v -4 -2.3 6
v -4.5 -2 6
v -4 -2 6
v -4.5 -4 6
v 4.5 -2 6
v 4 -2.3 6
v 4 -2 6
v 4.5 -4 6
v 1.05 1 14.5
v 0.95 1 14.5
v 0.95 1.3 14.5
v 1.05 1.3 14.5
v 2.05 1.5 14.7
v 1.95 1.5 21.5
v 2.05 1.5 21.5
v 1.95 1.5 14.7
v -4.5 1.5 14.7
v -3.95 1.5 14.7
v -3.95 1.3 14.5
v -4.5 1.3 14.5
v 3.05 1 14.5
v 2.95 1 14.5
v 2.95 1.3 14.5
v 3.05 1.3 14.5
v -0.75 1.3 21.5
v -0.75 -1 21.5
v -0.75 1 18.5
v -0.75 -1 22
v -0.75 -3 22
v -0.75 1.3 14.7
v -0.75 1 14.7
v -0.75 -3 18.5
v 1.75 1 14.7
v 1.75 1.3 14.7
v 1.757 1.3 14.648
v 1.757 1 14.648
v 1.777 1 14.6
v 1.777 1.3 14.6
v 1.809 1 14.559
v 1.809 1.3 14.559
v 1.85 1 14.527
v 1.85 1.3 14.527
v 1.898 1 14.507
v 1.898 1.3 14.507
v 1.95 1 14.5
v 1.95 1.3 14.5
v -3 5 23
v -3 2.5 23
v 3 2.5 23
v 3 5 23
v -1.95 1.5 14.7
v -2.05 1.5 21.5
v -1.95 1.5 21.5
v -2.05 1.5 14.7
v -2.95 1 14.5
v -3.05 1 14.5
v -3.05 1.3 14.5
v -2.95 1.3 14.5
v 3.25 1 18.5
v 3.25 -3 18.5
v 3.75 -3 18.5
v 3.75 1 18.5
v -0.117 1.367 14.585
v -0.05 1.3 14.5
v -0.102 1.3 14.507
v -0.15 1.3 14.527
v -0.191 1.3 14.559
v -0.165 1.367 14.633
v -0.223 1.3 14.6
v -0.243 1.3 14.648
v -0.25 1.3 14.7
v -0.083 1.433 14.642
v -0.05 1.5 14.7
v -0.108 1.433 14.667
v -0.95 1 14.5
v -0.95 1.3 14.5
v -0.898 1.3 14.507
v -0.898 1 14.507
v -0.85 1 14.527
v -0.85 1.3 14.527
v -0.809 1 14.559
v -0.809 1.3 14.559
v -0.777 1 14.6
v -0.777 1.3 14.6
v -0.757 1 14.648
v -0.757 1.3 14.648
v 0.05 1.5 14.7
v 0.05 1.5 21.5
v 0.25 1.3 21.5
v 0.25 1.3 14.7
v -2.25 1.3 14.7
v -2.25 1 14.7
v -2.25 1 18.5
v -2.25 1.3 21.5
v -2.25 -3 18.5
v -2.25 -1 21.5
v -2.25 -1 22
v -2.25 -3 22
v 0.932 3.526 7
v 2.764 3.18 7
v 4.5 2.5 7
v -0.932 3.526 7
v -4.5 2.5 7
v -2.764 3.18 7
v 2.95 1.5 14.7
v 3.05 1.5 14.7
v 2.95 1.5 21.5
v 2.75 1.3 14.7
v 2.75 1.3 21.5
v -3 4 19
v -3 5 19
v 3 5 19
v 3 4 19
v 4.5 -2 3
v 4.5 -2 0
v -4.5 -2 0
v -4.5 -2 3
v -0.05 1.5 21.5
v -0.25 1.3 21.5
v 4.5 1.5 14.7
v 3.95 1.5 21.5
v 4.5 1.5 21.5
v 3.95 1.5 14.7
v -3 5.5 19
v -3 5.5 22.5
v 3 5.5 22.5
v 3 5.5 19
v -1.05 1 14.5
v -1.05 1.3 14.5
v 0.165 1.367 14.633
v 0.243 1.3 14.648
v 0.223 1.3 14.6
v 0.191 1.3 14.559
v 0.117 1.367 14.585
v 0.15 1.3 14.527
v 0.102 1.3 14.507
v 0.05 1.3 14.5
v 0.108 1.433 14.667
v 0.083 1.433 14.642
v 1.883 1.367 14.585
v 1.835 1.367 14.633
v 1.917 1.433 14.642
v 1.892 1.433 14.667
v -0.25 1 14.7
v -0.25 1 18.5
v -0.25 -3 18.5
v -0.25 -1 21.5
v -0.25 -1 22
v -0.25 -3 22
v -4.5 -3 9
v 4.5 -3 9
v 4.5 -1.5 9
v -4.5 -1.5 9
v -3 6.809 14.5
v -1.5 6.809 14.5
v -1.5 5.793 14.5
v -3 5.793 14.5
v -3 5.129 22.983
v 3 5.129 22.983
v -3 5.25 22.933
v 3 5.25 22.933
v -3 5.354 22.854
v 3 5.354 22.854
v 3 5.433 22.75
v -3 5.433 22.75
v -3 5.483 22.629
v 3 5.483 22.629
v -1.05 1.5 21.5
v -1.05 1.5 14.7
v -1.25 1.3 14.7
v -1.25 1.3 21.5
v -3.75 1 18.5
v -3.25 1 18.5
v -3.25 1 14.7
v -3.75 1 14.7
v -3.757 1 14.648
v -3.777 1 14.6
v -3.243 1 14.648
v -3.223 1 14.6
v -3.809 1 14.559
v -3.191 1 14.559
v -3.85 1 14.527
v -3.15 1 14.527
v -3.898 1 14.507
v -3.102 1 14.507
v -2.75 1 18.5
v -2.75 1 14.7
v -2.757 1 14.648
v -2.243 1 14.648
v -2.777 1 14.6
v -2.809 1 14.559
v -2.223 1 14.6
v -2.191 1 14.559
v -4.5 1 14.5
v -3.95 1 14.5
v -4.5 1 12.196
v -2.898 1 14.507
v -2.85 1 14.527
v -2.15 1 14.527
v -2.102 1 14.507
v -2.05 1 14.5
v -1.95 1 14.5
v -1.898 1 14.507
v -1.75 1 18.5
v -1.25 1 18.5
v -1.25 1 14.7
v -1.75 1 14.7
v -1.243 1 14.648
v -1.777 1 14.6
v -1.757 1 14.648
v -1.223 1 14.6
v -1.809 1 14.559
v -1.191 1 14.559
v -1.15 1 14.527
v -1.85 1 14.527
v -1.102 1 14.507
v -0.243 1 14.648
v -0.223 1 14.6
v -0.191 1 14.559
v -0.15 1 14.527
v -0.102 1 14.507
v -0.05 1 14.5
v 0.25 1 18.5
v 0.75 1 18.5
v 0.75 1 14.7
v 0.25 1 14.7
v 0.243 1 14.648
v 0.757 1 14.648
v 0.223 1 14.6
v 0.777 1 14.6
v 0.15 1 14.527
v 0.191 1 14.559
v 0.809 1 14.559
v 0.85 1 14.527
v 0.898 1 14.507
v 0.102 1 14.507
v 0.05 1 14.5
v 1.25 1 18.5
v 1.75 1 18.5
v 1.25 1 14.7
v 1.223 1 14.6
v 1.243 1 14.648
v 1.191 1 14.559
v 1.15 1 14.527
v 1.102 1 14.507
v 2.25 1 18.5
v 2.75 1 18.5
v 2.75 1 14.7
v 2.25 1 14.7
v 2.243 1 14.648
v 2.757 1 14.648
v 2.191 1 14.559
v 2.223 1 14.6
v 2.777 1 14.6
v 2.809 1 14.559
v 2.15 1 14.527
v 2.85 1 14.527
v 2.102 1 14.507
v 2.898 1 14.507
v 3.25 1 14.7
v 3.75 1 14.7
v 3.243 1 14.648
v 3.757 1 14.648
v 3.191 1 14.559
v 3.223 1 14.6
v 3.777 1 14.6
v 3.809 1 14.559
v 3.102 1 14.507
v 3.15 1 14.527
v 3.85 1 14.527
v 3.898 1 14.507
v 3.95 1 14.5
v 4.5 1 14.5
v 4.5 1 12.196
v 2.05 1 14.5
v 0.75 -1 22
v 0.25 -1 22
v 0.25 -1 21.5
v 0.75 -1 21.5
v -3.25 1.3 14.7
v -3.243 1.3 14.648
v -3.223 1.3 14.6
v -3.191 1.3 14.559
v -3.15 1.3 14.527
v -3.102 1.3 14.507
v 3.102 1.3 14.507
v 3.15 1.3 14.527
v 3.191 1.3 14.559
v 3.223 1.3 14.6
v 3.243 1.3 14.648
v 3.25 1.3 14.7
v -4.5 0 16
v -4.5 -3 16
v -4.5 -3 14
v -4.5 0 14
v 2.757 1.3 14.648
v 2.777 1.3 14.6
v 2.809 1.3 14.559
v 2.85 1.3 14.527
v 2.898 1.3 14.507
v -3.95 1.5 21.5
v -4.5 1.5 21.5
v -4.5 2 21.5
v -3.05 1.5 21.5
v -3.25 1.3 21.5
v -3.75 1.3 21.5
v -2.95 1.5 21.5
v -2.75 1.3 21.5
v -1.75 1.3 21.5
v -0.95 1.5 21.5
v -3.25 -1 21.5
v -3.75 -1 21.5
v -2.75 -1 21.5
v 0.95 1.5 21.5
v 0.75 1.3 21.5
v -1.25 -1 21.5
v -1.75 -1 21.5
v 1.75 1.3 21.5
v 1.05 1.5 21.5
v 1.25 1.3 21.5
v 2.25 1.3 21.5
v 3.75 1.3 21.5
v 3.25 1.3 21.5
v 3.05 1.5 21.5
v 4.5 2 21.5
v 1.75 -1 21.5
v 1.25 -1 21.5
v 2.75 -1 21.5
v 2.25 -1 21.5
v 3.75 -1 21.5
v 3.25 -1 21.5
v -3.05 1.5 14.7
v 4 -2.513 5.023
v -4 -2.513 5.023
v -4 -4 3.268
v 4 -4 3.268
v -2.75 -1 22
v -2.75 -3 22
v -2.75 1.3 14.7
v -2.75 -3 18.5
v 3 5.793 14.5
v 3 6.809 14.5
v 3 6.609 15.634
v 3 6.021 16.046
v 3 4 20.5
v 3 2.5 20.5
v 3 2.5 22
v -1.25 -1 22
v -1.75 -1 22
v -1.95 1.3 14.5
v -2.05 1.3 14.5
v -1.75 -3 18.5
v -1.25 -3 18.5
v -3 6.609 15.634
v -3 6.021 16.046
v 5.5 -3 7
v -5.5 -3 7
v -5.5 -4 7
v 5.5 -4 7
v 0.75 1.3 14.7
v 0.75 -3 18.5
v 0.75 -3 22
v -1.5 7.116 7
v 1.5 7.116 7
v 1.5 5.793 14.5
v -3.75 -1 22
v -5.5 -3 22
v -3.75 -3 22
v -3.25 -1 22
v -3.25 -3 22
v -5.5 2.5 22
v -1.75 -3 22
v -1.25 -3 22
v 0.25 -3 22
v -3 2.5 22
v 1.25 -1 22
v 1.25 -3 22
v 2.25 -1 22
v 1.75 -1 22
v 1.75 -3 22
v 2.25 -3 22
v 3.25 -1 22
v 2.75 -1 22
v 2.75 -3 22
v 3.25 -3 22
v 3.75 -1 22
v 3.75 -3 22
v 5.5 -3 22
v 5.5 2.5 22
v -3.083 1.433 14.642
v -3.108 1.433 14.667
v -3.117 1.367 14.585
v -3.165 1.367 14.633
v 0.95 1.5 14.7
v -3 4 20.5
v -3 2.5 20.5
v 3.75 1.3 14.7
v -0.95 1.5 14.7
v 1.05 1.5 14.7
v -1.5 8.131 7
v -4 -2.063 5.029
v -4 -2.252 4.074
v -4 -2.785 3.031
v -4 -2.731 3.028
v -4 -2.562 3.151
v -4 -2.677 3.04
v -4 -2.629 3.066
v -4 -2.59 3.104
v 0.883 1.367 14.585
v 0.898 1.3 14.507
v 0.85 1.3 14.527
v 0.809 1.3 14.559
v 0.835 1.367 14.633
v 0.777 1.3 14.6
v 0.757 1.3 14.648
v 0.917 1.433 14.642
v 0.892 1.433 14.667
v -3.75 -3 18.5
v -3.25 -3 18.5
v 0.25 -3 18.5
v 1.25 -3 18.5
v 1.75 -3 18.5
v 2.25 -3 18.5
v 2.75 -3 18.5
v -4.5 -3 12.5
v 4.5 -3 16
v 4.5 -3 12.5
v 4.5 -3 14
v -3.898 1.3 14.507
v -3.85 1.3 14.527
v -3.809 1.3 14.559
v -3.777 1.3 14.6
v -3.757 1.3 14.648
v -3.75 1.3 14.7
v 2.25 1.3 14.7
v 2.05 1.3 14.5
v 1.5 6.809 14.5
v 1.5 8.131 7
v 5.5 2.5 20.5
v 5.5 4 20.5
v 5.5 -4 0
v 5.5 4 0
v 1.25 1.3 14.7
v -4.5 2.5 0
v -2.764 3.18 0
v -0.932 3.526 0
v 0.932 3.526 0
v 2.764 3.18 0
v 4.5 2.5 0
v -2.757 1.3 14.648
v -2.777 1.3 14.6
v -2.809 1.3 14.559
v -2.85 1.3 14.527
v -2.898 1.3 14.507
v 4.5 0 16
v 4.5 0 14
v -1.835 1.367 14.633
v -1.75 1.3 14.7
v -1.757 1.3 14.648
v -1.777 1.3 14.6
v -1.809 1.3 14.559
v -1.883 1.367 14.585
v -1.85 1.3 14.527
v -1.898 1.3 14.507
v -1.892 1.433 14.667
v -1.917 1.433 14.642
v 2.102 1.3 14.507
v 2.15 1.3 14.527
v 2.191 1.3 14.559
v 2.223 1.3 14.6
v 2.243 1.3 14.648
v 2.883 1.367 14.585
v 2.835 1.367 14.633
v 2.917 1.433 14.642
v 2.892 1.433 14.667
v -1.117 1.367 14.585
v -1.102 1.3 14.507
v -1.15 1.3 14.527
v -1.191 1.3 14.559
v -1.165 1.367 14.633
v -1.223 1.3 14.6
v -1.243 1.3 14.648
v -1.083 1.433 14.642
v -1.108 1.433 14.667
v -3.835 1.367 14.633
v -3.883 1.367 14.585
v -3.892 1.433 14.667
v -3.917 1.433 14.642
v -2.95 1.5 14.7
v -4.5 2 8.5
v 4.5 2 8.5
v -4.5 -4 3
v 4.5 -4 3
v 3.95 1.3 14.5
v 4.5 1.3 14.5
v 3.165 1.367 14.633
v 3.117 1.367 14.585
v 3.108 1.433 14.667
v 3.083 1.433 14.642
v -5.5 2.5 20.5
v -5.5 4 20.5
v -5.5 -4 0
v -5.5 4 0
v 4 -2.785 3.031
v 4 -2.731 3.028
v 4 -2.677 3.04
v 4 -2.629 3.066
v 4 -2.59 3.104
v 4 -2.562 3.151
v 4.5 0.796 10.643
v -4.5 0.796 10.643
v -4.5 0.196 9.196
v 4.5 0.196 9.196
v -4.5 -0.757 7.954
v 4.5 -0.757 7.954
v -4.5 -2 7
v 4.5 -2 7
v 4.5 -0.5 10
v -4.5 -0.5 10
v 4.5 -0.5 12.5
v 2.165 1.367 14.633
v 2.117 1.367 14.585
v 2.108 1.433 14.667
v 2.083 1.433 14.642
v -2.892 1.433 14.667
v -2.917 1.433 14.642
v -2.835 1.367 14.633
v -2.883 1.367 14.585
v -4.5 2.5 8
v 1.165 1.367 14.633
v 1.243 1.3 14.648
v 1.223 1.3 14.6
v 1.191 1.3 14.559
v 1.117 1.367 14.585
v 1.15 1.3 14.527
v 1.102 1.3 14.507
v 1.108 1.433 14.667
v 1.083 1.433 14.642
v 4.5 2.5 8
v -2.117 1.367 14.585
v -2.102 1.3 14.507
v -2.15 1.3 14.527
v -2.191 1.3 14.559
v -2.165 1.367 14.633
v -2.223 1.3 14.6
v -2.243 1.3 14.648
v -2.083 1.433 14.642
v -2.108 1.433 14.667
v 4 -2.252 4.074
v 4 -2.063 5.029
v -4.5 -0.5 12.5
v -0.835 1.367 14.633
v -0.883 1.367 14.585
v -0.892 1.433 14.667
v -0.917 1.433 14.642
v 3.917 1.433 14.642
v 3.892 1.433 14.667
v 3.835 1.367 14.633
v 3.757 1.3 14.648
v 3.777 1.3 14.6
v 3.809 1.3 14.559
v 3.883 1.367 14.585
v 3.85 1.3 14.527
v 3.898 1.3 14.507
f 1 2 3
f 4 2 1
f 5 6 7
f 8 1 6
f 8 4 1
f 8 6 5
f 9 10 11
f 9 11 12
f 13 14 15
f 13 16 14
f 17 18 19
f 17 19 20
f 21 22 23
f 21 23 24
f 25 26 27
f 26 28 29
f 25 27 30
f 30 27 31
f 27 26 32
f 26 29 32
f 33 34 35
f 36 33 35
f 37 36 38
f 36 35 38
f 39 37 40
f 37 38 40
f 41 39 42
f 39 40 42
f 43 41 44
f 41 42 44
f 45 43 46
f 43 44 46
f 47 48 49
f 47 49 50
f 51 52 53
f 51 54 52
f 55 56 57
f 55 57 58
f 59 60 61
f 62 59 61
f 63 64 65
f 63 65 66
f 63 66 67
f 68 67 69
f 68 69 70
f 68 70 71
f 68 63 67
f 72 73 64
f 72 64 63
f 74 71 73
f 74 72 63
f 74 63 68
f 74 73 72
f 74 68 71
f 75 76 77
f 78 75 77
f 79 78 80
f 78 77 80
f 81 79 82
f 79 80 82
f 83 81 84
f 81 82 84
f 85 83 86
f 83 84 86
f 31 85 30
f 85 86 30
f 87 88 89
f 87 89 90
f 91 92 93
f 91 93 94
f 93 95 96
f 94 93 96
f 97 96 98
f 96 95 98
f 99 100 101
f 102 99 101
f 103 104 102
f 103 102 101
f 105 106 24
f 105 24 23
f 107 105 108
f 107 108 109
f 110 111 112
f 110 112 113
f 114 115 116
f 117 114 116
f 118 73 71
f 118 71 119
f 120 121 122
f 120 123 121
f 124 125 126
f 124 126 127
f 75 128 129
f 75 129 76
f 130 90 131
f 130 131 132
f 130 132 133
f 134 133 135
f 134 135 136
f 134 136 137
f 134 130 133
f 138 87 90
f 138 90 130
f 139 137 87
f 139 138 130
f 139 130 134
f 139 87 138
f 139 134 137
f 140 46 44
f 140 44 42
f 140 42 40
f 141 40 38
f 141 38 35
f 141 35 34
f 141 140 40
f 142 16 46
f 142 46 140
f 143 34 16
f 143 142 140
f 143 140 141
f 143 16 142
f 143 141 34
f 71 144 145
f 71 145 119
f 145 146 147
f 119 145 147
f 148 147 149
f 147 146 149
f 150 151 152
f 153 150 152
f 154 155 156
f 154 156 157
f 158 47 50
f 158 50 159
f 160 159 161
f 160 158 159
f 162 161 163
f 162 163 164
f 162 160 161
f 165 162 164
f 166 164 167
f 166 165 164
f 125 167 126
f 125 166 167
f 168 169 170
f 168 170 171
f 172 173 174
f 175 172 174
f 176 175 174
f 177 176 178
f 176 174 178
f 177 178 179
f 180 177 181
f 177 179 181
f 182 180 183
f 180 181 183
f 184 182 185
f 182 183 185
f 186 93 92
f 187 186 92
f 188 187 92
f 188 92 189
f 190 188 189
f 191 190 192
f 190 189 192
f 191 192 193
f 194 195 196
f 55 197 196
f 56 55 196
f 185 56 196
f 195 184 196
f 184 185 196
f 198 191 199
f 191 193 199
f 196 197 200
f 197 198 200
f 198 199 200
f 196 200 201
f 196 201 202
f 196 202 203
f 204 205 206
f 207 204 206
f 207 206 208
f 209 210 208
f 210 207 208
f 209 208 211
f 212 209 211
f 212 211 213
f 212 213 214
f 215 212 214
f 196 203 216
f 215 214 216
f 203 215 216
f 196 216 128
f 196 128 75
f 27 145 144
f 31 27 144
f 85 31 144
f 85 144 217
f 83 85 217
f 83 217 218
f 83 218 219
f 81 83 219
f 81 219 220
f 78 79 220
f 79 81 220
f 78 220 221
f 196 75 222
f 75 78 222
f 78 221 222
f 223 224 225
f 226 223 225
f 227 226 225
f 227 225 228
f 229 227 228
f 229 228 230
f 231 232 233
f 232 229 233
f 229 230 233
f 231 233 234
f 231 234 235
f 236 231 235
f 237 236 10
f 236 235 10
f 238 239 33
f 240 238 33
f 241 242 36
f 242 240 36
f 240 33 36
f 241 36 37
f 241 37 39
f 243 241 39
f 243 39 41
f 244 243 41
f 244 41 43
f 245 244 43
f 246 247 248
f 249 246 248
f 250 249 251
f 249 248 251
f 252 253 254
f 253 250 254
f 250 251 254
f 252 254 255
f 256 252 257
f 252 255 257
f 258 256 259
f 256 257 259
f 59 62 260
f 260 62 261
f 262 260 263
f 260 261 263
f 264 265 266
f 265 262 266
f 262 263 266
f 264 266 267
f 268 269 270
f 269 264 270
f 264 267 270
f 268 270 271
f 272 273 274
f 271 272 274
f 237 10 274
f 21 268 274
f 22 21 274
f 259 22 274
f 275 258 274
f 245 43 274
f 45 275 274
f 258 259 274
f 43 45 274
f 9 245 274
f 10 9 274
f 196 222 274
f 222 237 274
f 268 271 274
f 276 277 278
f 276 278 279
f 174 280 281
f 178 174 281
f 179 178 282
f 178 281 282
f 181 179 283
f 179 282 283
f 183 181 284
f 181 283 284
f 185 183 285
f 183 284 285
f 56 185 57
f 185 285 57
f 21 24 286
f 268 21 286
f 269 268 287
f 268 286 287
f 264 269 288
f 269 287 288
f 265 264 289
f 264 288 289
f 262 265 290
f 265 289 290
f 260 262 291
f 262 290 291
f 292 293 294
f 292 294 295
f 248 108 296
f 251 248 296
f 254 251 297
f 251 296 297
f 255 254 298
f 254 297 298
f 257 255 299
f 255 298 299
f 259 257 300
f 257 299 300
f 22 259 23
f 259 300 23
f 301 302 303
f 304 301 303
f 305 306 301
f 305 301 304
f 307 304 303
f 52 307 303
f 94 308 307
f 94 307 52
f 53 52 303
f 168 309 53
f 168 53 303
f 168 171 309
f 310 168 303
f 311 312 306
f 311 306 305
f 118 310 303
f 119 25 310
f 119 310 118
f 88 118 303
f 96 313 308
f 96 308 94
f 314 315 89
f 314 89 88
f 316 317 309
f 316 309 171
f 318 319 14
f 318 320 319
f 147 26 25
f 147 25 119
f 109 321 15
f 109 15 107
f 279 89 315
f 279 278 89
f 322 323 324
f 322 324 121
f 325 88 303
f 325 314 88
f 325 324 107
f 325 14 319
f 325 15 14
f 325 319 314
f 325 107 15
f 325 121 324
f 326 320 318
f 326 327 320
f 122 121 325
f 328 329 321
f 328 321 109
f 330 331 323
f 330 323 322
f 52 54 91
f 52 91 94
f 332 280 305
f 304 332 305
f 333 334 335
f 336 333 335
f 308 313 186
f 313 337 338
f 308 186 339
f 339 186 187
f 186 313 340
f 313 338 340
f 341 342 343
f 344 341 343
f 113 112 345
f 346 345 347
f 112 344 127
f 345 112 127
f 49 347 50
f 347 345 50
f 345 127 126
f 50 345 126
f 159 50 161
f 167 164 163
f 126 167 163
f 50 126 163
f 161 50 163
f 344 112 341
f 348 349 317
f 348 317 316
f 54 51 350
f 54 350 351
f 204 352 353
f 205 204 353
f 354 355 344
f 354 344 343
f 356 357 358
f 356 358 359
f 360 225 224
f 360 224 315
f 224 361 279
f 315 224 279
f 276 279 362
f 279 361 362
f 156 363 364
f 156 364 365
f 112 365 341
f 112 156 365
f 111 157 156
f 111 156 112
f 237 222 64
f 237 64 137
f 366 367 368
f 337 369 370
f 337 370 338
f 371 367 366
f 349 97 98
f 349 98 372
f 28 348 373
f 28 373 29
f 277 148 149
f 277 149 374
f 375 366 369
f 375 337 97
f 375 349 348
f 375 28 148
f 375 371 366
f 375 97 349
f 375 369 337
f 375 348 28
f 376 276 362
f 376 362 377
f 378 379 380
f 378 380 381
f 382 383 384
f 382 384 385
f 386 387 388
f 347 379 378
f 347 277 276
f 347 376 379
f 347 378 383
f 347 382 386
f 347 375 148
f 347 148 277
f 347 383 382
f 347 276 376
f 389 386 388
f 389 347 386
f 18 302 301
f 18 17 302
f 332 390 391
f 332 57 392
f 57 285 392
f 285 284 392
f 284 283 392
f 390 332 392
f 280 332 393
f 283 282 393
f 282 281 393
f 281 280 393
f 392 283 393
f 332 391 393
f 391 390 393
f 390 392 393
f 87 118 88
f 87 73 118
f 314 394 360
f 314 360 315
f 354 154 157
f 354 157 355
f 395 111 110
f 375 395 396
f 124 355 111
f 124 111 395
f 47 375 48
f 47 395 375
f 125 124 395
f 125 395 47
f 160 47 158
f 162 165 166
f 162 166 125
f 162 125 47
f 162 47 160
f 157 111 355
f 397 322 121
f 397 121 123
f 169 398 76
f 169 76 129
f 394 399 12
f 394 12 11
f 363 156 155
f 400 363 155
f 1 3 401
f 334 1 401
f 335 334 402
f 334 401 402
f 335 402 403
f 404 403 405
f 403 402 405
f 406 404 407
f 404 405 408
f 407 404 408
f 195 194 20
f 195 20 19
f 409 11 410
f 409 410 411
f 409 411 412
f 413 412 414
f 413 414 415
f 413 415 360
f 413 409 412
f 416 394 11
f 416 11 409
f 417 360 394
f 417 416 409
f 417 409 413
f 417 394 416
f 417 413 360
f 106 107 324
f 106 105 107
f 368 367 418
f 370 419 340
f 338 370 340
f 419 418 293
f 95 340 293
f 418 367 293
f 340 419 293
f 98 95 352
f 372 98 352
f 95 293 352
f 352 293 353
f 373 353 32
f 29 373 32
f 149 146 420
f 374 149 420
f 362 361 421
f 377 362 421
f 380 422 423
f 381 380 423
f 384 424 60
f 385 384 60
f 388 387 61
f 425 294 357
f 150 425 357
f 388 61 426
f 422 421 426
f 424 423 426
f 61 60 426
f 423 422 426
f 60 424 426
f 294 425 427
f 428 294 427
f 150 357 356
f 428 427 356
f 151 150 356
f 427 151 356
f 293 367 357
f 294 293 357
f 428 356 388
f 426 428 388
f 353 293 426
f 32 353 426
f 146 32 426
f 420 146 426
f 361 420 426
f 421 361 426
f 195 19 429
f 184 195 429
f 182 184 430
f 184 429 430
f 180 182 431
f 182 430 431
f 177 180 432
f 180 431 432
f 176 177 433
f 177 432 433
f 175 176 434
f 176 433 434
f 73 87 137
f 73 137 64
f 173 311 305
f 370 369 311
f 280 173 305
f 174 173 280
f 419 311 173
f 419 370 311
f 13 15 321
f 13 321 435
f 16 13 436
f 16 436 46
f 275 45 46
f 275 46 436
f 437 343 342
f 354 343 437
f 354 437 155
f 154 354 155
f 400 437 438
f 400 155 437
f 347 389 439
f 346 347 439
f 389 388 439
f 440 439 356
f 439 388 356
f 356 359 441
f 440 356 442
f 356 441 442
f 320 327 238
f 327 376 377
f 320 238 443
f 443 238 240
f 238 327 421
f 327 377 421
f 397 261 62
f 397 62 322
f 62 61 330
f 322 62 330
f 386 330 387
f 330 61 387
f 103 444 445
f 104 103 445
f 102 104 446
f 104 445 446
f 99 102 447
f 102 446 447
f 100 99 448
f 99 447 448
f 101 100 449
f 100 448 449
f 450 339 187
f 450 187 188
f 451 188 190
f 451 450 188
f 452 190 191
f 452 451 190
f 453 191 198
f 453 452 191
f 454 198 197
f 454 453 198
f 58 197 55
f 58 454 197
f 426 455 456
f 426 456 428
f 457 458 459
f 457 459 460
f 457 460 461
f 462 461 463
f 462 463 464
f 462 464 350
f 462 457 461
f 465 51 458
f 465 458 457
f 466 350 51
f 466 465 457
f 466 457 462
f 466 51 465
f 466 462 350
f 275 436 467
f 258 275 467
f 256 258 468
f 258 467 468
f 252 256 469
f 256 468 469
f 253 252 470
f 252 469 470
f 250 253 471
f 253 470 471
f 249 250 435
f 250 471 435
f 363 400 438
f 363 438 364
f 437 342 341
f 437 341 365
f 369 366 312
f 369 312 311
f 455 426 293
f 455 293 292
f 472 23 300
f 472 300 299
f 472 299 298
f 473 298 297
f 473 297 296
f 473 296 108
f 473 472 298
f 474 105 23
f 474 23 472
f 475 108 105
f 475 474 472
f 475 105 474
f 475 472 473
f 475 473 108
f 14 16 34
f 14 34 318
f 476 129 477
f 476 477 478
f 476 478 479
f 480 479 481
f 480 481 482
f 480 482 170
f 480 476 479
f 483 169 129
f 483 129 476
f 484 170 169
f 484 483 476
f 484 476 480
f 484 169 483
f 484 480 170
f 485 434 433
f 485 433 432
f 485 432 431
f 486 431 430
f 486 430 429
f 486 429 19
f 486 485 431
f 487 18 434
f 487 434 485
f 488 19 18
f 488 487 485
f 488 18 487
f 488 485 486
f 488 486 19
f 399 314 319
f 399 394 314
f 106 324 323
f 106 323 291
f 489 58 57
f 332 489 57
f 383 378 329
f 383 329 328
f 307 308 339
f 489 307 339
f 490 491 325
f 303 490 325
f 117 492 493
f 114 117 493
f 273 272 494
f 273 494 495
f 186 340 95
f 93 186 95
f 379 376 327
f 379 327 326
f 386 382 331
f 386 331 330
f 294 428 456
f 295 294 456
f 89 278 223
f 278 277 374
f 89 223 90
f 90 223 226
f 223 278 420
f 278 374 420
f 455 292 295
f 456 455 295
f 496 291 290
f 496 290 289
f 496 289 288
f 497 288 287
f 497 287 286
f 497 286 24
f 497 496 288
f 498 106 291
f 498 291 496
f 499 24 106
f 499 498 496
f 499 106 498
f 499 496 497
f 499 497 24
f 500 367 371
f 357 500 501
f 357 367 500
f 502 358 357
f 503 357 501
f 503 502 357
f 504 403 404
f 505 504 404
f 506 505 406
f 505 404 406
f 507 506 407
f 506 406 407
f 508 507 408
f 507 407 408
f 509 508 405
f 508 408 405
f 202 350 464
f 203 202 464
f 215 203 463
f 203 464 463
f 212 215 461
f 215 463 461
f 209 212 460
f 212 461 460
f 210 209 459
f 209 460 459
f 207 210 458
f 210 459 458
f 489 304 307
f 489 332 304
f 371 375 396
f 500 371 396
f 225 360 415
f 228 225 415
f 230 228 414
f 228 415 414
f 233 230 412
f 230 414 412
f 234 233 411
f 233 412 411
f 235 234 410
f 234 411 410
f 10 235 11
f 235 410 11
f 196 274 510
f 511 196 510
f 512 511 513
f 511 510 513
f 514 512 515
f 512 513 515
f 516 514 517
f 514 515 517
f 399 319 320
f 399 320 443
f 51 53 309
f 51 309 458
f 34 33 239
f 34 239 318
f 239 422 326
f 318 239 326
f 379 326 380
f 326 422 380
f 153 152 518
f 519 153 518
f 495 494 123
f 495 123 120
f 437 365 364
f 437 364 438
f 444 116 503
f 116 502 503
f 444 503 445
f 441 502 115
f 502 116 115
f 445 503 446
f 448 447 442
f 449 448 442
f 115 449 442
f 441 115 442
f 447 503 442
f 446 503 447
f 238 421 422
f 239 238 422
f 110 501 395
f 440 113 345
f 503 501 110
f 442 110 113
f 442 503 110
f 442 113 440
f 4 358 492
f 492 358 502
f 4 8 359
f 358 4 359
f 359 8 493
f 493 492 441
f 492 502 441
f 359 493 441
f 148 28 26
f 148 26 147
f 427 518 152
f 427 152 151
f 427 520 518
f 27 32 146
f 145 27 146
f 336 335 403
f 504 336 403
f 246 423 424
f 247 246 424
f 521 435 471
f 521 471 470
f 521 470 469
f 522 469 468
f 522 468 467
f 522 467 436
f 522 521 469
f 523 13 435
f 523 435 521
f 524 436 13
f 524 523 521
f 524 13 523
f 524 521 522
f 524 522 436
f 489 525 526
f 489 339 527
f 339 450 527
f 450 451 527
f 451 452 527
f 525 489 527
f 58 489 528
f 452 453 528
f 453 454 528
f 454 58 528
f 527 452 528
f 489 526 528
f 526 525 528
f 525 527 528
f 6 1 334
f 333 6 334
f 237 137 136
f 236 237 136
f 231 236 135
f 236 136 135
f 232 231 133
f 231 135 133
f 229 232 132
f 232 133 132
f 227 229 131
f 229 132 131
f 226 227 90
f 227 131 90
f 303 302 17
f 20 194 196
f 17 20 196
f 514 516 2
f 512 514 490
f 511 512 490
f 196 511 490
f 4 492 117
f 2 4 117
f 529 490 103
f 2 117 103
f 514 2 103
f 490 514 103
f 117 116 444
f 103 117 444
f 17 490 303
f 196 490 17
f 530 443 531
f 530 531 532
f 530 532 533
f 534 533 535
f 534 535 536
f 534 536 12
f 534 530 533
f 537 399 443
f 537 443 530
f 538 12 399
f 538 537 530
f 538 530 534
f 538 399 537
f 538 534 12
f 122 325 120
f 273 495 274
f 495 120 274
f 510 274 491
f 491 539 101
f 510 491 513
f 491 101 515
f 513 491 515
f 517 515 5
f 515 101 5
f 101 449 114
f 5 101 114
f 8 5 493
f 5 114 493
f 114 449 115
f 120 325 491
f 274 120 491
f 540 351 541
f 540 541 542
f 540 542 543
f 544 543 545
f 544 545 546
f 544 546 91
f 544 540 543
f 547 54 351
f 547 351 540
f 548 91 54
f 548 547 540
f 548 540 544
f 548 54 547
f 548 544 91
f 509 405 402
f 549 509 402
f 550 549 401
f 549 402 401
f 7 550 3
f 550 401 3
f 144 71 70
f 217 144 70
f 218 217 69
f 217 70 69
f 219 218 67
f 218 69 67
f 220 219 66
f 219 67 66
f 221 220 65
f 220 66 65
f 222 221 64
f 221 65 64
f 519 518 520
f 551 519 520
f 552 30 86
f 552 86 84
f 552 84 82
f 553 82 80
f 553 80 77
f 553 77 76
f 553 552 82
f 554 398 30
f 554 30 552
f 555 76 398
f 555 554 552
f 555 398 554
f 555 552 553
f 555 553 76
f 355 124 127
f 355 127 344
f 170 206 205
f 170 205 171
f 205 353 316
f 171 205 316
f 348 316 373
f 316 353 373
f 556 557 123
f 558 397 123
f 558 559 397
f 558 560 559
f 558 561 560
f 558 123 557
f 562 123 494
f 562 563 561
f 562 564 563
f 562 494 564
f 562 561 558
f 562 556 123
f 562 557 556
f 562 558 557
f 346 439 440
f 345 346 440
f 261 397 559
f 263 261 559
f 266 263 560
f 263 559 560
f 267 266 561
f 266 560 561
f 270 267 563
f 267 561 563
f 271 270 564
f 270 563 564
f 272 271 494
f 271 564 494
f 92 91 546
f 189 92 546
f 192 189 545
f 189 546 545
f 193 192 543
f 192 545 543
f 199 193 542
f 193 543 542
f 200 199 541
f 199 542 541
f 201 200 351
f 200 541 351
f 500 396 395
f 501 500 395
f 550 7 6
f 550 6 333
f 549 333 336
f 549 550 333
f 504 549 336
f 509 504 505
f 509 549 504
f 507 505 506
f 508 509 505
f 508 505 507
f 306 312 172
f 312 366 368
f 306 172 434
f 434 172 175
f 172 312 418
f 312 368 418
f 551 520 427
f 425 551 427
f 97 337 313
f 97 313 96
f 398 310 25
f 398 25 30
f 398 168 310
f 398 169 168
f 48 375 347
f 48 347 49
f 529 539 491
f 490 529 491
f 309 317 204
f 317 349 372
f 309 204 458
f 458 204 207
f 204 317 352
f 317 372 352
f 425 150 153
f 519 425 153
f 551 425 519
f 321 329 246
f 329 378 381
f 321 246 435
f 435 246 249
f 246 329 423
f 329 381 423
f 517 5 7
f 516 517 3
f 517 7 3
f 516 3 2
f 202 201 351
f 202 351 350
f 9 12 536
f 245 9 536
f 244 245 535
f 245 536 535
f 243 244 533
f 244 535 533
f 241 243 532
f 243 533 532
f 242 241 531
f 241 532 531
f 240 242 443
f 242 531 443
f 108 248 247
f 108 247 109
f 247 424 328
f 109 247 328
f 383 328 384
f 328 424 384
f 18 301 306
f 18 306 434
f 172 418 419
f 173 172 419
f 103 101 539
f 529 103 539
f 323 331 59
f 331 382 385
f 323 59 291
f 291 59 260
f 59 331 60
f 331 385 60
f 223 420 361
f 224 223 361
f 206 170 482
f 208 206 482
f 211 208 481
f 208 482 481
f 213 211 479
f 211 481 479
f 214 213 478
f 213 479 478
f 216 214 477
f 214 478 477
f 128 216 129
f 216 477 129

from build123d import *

# Parameters (mm, degrees)
SCHIZZO1_W                           = 11
SCHIZZO1_H                           = 8
ESTRUSIONE_ESTRUSIONE1_DEPTH         = 7
SCHIZZO2_W                           = 11
SCHIZZO2_H                           = 7
ESTRUSIONE_ESTRUSIONE2_DEPTH         = 15
TAGLIO_ESTRUSIONE1_DEPTH             = 7
SCHIZZO4_W                           = 9
SCHIZZO4_H                           = 3
TAGLIO_ESTRUSIONE2_DEPTH             = 2
TAGLIO_ESTRUSIONE3_REACH             = 25.027
SCHIZZO5_W                           = 2
SCHIZZO5_H                           = 3
TAGLIO_ESTRUSIONE3_DIRECTION_2_REACH = 25.027
SCHIZZO6_W                           = 0.5
SCHIZZO6_H                           = 3
TAGLIO_ESTRUSIONE4_DEPTH             = 4
SCHIZZO7_W                           = 0.5
SCHIZZO7_H                           = 0.5
TAGLIO_ESTRUSIONE5_DEPTH             = 2
ESTRUSIONE_ESTRUSIONE7_DEPTH         = 4
ESTRUSIONE_ESTRUSIONE7_DEPTH_BACK    = 4
SCHIZZO9_W                           = 0.5
SCHIZZO9_H                           = 7
SCHIZZO9_W_2                         = 0.75
ESTRUSIONE_ESTRUSIONE8_DEPTH         = 0.5
RACCORDO1_R                          = 0.2
SMUSSO1_SIZE                         = 0.2
SCHIZZO10_W                          = 1.5
SCHIZZO10_H                          = 1.5
TAGLIO_ESTRUSIONE6_DEPTH             = 25.919871589
ESTRUSIONE_ESTRUSIONE9_DEPTH         = 3
ESTRUSIONE_ESTRUSIONE9_DEPTH_BACK    = 3
SCHIZZO12_W                          = 1.5
SCHIZZO12_H                          = 3.13135038
TAGLIO_ESTRUSIONE7_DEPTH             = 7.5


with BuildPart() as part:
    # Schizzo1 → Estrusione-Estrusione1 (new body)
    with BuildSketch(Plane.XY):
        Rectangle(SCHIZZO1_W, SCHIZZO1_H)
    extrude(amount=ESTRUSIONE_ESTRUSIONE1_DEPTH)

    # Schizzo2 → Estrusione-Estrusione2 (add)
    with BuildSketch(Plane.XY.offset(7)):
        with Locations((0, 0.5)):
            Rectangle(SCHIZZO2_W, SCHIZZO2_H)
    extrude(amount=ESTRUSIONE_ESTRUSIONE2_DEPTH)

    # Schizzo3 → Taglio-Estrusione1 (cut)
    with BuildSketch(Plane(origin=(0, 0, 0), x_dir=(-1, 0, 0), z_dir=(0, 0, -1))):
        with BuildLine():
            Line((-4.5, 2.5), (-4.5, -2))
            Line((-4.5, -2), (4.5, -2))
            Line((4.5, -2), (4.5, 2.5))
            ThreePointArc((4.5, 2.5), (0, 3.56971445), (-4.5, 2.5))
        make_face()
    extrude(amount=-TAGLIO_ESTRUSIONE1_DEPTH, mode=Mode.SUBTRACT)

    # Schizzo4 → Taglio-Estrusione2 (cut)
    with BuildSketch(Plane.XZ.offset(4)):
        with Locations((0, 4.5)):
            Rectangle(SCHIZZO4_W, SCHIZZO4_H)
    extrude(amount=-TAGLIO_ESTRUSIONE2_DEPTH, mode=Mode.SUBTRACT)

    # Taglio-Estrusione3: up to this face of the body (flat: up to its plane)
    taglio_estrusione3_end = Plane(part.part.faces().sort_by_distance((-4.5, -0.27, 3.66))[0])
    # Schizzo5 → Taglio-Estrusione3 (cut, up to the picked face)
    with BuildSketch(Plane(origin=(0, 0, 0), x_dir=(0, 0, -1), z_dir=(1, 0, 0)), mode=Mode.PRIVATE) as taglio_estrusione3_sk1:
        with BuildLine():
            Line((-7, -2), (-7, 2.5))
            Line((-7, 2.5), (-8, 2.5))
            Line((-8, 2.5), (-8.5, 2))
            Line((-8.5, 2), (-21.5, 2))
            Line((-21.5, 2), (-21.5, 1))
            Line((-21.5, 1), (-12.196152423, 1))
            ThreePointArc((-12.196152423, 1), (-9.196152423, 0.196152423), (-7, -2))
        make_face()
    taglio_estrusione3_tool1 = split(extrude(taglio_estrusione3_sk1.sketch, amount=-TAGLIO_ESTRUSIONE3_REACH, mode=Mode.PRIVATE), bisect_by=taglio_estrusione3_end, keep=Keep.BOTH, mode=Mode.PRIVATE)
    # Schizzo5 → Taglio-Estrusione3 (cut, up to the picked face)
    with BuildSketch(Plane(origin=(0, 0, 0), x_dir=(0, 0, -1), z_dir=(1, 0, 0)), mode=Mode.PRIVATE) as taglio_estrusione3_sk2:
        Polygon((-9, -3), (-9, -1.5), (-10, -0.5), (-12.5, -0.5), (-12.5, -3), align=None)
    taglio_estrusione3_tool2 = split(extrude(taglio_estrusione3_sk2.sketch, amount=-TAGLIO_ESTRUSIONE3_REACH, mode=Mode.PRIVATE), bisect_by=taglio_estrusione3_end, keep=Keep.BOTH, mode=Mode.PRIVATE)
    # Schizzo5 → Taglio-Estrusione3 (cut, up to the picked face)
    with BuildSketch(Plane(origin=(0, 0, 0), x_dir=(0, 0, -1), z_dir=(1, 0, 0)), mode=Mode.PRIVATE) as taglio_estrusione3_sk3:
        with Locations((-15, -1.5)):
            Rectangle(SCHIZZO5_W, SCHIZZO5_H)
    taglio_estrusione3_tool3 = split(extrude(taglio_estrusione3_sk3.sketch, amount=-TAGLIO_ESTRUSIONE3_REACH, mode=Mode.PRIVATE), bisect_by=taglio_estrusione3_end, keep=Keep.BOTH, mode=Mode.PRIVATE)
    add(taglio_estrusione3_tool1.solids().sort_by(Axis((0, 1.213893, 12.650368), (-1, 0, 0)))[0], mode=Mode.SUBTRACT)
    add(taglio_estrusione3_tool2.solids().sort_by(Axis((0, -1.805556, 10.835859), (-1, 0, 0)))[0], mode=Mode.SUBTRACT)
    add(taglio_estrusione3_tool3.solids().sort_by(Axis((0, -1.5, 15), (-1, 0, 0)))[0], mode=Mode.SUBTRACT)

    # Taglio-Estrusione3 direction 2: up to this face of the body (flat: up to its plane)
    taglio_estrusione3_direction_2_end = Plane(part.part.faces().sort_by_distance((4.5, -0.27, 3.66))[0])
    # Schizzo5 → Taglio-Estrusione3 direction 2 (cut, up to the picked face)
    with BuildSketch(Plane(origin=(0, 0, 0), x_dir=(0, 0, -1), z_dir=(1, 0, 0)), mode=Mode.PRIVATE) as taglio_estrusione3_direction_2_sk1:
        with BuildLine():
            Line((-7, -2), (-7, 2.5))
            Line((-7, 2.5), (-8, 2.5))
            Line((-8, 2.5), (-8.5, 2))
            Line((-8.5, 2), (-21.5, 2))
            Line((-21.5, 2), (-21.5, 1))
            Line((-21.5, 1), (-12.196152423, 1))
            ThreePointArc((-12.196152423, 1), (-9.196152423, 0.196152423), (-7, -2))
        make_face()
    taglio_estrusione3_direction_2_tool1 = split(extrude(taglio_estrusione3_direction_2_sk1.sketch, amount=TAGLIO_ESTRUSIONE3_DIRECTION_2_REACH, mode=Mode.PRIVATE), bisect_by=taglio_estrusione3_direction_2_end, keep=Keep.BOTH, mode=Mode.PRIVATE)
    # Schizzo5 → Taglio-Estrusione3 direction 2 (cut, up to the picked face)
    with BuildSketch(Plane(origin=(0, 0, 0), x_dir=(0, 0, -1), z_dir=(1, 0, 0)), mode=Mode.PRIVATE) as taglio_estrusione3_direction_2_sk2:
        Polygon((-9, -3), (-9, -1.5), (-10, -0.5), (-12.5, -0.5), (-12.5, -3), align=None)
    taglio_estrusione3_direction_2_tool2 = split(extrude(taglio_estrusione3_direction_2_sk2.sketch, amount=TAGLIO_ESTRUSIONE3_DIRECTION_2_REACH, mode=Mode.PRIVATE), bisect_by=taglio_estrusione3_direction_2_end, keep=Keep.BOTH, mode=Mode.PRIVATE)
    # Schizzo5 → Taglio-Estrusione3 direction 2 (cut, up to the picked face)
    with BuildSketch(Plane(origin=(0, 0, 0), x_dir=(0, 0, -1), z_dir=(1, 0, 0)), mode=Mode.PRIVATE) as taglio_estrusione3_direction_2_sk3:
        with Locations((-15, -1.5)):
            Rectangle(SCHIZZO5_W, SCHIZZO5_H)
    taglio_estrusione3_direction_2_tool3 = split(extrude(taglio_estrusione3_direction_2_sk3.sketch, amount=TAGLIO_ESTRUSIONE3_DIRECTION_2_REACH, mode=Mode.PRIVATE), bisect_by=taglio_estrusione3_direction_2_end, keep=Keep.BOTH, mode=Mode.PRIVATE)
    add(taglio_estrusione3_direction_2_tool1.solids().sort_by(Axis((0, 1.213893, 12.650368), (1, 0, 0)))[0], mode=Mode.SUBTRACT)
    add(taglio_estrusione3_direction_2_tool2.solids().sort_by(Axis((0, -1.805556, 10.835859), (1, 0, 0)))[0], mode=Mode.SUBTRACT)
    add(taglio_estrusione3_direction_2_tool3.solids().sort_by(Axis((0, -1.5, 15), (1, 0, 0)))[0], mode=Mode.SUBTRACT)

    # Schizzo6 → Taglio-Estrusione4 (cut)
    with BuildSketch(Plane.XZ.offset(3)):
        with Locations((-3.5, 20)):
            Rectangle(SCHIZZO6_W, SCHIZZO6_H)
        with Locations((-2.5, 20)):
            Rectangle(SCHIZZO6_W, SCHIZZO6_H)
        with Locations((-1.5, 20)):
            Rectangle(SCHIZZO6_W, SCHIZZO6_H)
        with Locations((-0.5, 20)):
            Rectangle(SCHIZZO6_W, SCHIZZO6_H)
        with Locations((0.5, 20)):
            Rectangle(SCHIZZO6_W, SCHIZZO6_H)
        with Locations((1.5, 20)):
            Rectangle(SCHIZZO6_W, SCHIZZO6_H)
        with Locations((2.5, 20)):
            Rectangle(SCHIZZO6_W, SCHIZZO6_H)
        with Locations((3.5, 20)):
            Rectangle(SCHIZZO6_W, SCHIZZO6_H)
    extrude(amount=-TAGLIO_ESTRUSIONE4_DEPTH, mode=Mode.SUBTRACT)

    # Schizzo7 → Taglio-Estrusione5 (cut)
    with BuildSketch(Plane.XZ.offset(3)):
        with Locations((-3.5, 21.75)):
            Rectangle(SCHIZZO7_W, SCHIZZO7_H)
        with Locations((-2.5, 21.75)):
            Rectangle(SCHIZZO7_W, SCHIZZO7_H)
        with Locations((-1.5, 21.75)):
            Rectangle(SCHIZZO7_W, SCHIZZO7_H)
        with Locations((-0.5, 21.75)):
            Rectangle(SCHIZZO7_W, SCHIZZO7_H)
        with Locations((0.5, 21.75)):
            Rectangle(SCHIZZO7_W, SCHIZZO7_H)
        with Locations((1.5, 21.75)):
            Rectangle(SCHIZZO7_W, SCHIZZO7_H)
        with Locations((2.5, 21.75)):
            Rectangle(SCHIZZO7_W, SCHIZZO7_H)
        with Locations((3.5, 21.75)):
            Rectangle(SCHIZZO7_W, SCHIZZO7_H)
    extrude(amount=-TAGLIO_ESTRUSIONE5_DEPTH, mode=Mode.SUBTRACT)

    # Schizzo8 → Estrusione-Estrusione7 (add, two sides: drawn at the far end of the back side and taken through both)
    with BuildSketch(Plane(origin=(0, 0, 0), x_dir=(0, 0, -1), z_dir=(1, 0, 0)).offset(-ESTRUSIONE_ESTRUSIONE7_DEPTH_BACK)):
        with BuildLine():
            Line((-6, -2), (-6, -2.3))
            Line((-6, -2.3), (-5.022904001, -2.512798985))
            Line((-5.022904001, -2.512798985), (-3.268414576, -4))
            Line((-3.268414576, -4), (-3.031110437, -2.785373321))
            ThreePointArc((-3.031110437, -2.785373321), (-3.051323254, -2.652170285), (-3.151437659, -2.562010912))
            ThreePointArc((-3.151437659, -2.562010912), (-4.548262793, -2.141844043), (-6, -2))
        make_face()
    extrude(amount=ESTRUSIONE_ESTRUSIONE7_DEPTH + ESTRUSIONE_ESTRUSIONE7_DEPTH_BACK)

    # Schizzo9 → Estrusione-Estrusione8 (add)
    with BuildSketch(Plane(origin=(0, 1, 0), x_dir=(1, 0, 0), z_dir=(0, 1, 0))):
        with Locations((-3, -18)):
            Rectangle(SCHIZZO9_W, SCHIZZO9_H)
        with Locations((-2, -18)):
            Rectangle(SCHIZZO9_W, SCHIZZO9_H)
        with Locations((-1, -18)):
            Rectangle(SCHIZZO9_W, SCHIZZO9_H)
        with Locations((0, -18)):
            Rectangle(SCHIZZO9_W, SCHIZZO9_H)
        with Locations((1, -18)):
            Rectangle(SCHIZZO9_W, SCHIZZO9_H)
        with Locations((2, -18)):
            Rectangle(SCHIZZO9_W, SCHIZZO9_H)
        with Locations((3, -18)):
            Rectangle(SCHIZZO9_W, SCHIZZO9_H)
        with Locations((4.125, -18)):
            Rectangle(SCHIZZO9_W_2, SCHIZZO9_H)
        with Locations((-4.125, -18)):
            Rectangle(SCHIZZO9_W_2, SCHIZZO9_H)
    extrude(amount=ESTRUSIONE_ESTRUSIONE8_DEPTH)

    # Raccordo1
    raccordo1_edges = [part.edges().sort_by_distance(p)[0] for p in [
        (-3.25, 1.25, 14.5),
        (-2.75, 1.25, 14.5),
        (3.75, 1.25, 14.5),
        (-1.75, 1.25, 14.5),
        (-2.25, 1.25, 14.5),
        (-0.75, 1.25, 14.5),
        (-1.25, 1.25, 14.5),
        (0.25, 1.25, 14.5),
        (-0.25, 1.25, 14.5),
        (1.25, 1.25, 14.5),
        (0.75, 1.25, 14.5),
        (2.25, 1.25, 14.5),
        (1.75, 1.25, 14.5),
        (3.25, 1.25, 14.5),
        (2.75, 1.25, 14.5),
        (-3.75, 1.25, 14.5),
    ]]
    fillet(raccordo1_edges, radius=RACCORDO1_R)

    # Smusso1
    smusso1_edges = [part.edges().sort_by_distance(p)[0] for p in [
        (-2.75, 1.5, 18.1),
        (4.225, 1.5, 14.5),
        (-1.75, 1.5, 18.1),
        (-0.75, 1.5, 18.1),
        (0.25, 1.5, 18.1),
        (1.25, 1.5, 18.1),
        (2.25, 1.5, 18.1),
        (3.25, 1.5, 18.1),
        (-3.75, 1.5, 18.1),
        (-3.25, 1.5, 18.1),
        (-3, 1.5, 14.5),
        (-2.808578644, 1.5, 14.558578644),
        (-3.191421356, 1.5, 14.558578644),
        (-2.25, 1.5, 18.1),
        (-2, 1.5, 14.5),
        (-1.808578644, 1.5, 14.558578644),
        (-2.191421356, 1.5, 14.558578644),
        (-1.25, 1.5, 18.1),
        (-1, 1.5, 14.5),
        (-0.808578644, 1.5, 14.558578644),
        (-1.191421356, 1.5, 14.558578644),
        (-0.25, 1.5, 18.1),
        (0, 1.5, 14.5),
        (0.191421356, 1.5, 14.558578644),
        (-0.191421356, 1.5, 14.558578644),
        (0.75, 1.5, 18.1),
        (1, 1.5, 14.5),
        (1.191421356, 1.5, 14.558578644),
        (0.808578644, 1.5, 14.558578644),
        (1.75, 1.5, 18.1),
        (2, 1.5, 14.5),
        (2.191421356, 1.5, 14.558578644),
        (1.808578644, 1.5, 14.558578644),
        (2.75, 1.5, 18.1),
        (3, 1.5, 14.5),
        (3.191421356, 1.5, 14.558578644),
        (2.808578644, 1.5, 14.558578644),
        (-4.225, 1.5, 14.5),
        (-3.808578644, 1.5, 14.558578644),
        (3.75, 1.5, 18.1),
        (3.808578644, 1.5, 14.558578644),
    ]]
    chamfer(smusso1_edges, length=SMUSSO1_SIZE)

    # Schizzo10 → Taglio-Estrusione6 (cut, through all)
    with BuildSketch(Plane(origin=(5.5, 0, 0), x_dir=(0, 0, -1), z_dir=(1, 0, 0))):
        with Locations((-21.25, 3.25)):
            Rectangle(SCHIZZO10_W, SCHIZZO10_H)
    extrude(amount=-TAGLIO_ESTRUSIONE6_DEPTH, mode=Mode.SUBTRACT)

    # Schizzo11 → Estrusione-Estrusione9 (add, two sides: drawn at the far end of the back side and taken through both)
    with BuildSketch(Plane(origin=(0, 0, 0), x_dir=(0, 0, -1), z_dir=(1, 0, 0)).offset(-ESTRUSIONE_ESTRUSIONE9_DEPTH_BACK)):
        with BuildLine():
            Line((-20.5, 2.5), (-23, 2.5))
            Line((-23, 2.5), (-23, 5))
            ThreePointArc((-23, 5), (-22.853553391, 5.353553391), (-22.5, 5.5))
            Line((-22.5, 5.5), (-19, 5.5))
            Line((-19, 5.5), (-16.045576741, 6.020944533))
            Line((-16.045576741, 6.020944533), (-15.633835285, 6.608972273))
            Line((-15.633835285, 6.608972273), (-7, 8.13135038))
            Line((-7, 8.13135038), (-7, 7.115923769))
            Line((-7, 7.115923769), (-19, 5))
            Line((-19, 5), (-19, 4))
            Line((-19, 4), (-20.5, 4))
            Line((-20.5, 4), (-20.5, 2.5))
        make_face()
    extrude(amount=ESTRUSIONE_ESTRUSIONE9_DEPTH + ESTRUSIONE_ESTRUSIONE9_DEPTH_BACK)

    # Schizzo12 → Taglio-Estrusione7 (cut)
    with BuildSketch(Plane(origin=(0, 0, 7), x_dir=(-1, 0, 0), z_dir=(0, 0, -1))):
        with Locations((-2.25, 6.56567519)):
            Rectangle(SCHIZZO12_W, SCHIZZO12_H)
        with Locations((2.25, 6.56567519)):
            Rectangle(SCHIZZO12_W, SCHIZZO12_H)
    extrude(amount=-TAGLIO_ESTRUSIONE7_DEPTH, mode=Mode.SUBTRACT)


solid = part.part
